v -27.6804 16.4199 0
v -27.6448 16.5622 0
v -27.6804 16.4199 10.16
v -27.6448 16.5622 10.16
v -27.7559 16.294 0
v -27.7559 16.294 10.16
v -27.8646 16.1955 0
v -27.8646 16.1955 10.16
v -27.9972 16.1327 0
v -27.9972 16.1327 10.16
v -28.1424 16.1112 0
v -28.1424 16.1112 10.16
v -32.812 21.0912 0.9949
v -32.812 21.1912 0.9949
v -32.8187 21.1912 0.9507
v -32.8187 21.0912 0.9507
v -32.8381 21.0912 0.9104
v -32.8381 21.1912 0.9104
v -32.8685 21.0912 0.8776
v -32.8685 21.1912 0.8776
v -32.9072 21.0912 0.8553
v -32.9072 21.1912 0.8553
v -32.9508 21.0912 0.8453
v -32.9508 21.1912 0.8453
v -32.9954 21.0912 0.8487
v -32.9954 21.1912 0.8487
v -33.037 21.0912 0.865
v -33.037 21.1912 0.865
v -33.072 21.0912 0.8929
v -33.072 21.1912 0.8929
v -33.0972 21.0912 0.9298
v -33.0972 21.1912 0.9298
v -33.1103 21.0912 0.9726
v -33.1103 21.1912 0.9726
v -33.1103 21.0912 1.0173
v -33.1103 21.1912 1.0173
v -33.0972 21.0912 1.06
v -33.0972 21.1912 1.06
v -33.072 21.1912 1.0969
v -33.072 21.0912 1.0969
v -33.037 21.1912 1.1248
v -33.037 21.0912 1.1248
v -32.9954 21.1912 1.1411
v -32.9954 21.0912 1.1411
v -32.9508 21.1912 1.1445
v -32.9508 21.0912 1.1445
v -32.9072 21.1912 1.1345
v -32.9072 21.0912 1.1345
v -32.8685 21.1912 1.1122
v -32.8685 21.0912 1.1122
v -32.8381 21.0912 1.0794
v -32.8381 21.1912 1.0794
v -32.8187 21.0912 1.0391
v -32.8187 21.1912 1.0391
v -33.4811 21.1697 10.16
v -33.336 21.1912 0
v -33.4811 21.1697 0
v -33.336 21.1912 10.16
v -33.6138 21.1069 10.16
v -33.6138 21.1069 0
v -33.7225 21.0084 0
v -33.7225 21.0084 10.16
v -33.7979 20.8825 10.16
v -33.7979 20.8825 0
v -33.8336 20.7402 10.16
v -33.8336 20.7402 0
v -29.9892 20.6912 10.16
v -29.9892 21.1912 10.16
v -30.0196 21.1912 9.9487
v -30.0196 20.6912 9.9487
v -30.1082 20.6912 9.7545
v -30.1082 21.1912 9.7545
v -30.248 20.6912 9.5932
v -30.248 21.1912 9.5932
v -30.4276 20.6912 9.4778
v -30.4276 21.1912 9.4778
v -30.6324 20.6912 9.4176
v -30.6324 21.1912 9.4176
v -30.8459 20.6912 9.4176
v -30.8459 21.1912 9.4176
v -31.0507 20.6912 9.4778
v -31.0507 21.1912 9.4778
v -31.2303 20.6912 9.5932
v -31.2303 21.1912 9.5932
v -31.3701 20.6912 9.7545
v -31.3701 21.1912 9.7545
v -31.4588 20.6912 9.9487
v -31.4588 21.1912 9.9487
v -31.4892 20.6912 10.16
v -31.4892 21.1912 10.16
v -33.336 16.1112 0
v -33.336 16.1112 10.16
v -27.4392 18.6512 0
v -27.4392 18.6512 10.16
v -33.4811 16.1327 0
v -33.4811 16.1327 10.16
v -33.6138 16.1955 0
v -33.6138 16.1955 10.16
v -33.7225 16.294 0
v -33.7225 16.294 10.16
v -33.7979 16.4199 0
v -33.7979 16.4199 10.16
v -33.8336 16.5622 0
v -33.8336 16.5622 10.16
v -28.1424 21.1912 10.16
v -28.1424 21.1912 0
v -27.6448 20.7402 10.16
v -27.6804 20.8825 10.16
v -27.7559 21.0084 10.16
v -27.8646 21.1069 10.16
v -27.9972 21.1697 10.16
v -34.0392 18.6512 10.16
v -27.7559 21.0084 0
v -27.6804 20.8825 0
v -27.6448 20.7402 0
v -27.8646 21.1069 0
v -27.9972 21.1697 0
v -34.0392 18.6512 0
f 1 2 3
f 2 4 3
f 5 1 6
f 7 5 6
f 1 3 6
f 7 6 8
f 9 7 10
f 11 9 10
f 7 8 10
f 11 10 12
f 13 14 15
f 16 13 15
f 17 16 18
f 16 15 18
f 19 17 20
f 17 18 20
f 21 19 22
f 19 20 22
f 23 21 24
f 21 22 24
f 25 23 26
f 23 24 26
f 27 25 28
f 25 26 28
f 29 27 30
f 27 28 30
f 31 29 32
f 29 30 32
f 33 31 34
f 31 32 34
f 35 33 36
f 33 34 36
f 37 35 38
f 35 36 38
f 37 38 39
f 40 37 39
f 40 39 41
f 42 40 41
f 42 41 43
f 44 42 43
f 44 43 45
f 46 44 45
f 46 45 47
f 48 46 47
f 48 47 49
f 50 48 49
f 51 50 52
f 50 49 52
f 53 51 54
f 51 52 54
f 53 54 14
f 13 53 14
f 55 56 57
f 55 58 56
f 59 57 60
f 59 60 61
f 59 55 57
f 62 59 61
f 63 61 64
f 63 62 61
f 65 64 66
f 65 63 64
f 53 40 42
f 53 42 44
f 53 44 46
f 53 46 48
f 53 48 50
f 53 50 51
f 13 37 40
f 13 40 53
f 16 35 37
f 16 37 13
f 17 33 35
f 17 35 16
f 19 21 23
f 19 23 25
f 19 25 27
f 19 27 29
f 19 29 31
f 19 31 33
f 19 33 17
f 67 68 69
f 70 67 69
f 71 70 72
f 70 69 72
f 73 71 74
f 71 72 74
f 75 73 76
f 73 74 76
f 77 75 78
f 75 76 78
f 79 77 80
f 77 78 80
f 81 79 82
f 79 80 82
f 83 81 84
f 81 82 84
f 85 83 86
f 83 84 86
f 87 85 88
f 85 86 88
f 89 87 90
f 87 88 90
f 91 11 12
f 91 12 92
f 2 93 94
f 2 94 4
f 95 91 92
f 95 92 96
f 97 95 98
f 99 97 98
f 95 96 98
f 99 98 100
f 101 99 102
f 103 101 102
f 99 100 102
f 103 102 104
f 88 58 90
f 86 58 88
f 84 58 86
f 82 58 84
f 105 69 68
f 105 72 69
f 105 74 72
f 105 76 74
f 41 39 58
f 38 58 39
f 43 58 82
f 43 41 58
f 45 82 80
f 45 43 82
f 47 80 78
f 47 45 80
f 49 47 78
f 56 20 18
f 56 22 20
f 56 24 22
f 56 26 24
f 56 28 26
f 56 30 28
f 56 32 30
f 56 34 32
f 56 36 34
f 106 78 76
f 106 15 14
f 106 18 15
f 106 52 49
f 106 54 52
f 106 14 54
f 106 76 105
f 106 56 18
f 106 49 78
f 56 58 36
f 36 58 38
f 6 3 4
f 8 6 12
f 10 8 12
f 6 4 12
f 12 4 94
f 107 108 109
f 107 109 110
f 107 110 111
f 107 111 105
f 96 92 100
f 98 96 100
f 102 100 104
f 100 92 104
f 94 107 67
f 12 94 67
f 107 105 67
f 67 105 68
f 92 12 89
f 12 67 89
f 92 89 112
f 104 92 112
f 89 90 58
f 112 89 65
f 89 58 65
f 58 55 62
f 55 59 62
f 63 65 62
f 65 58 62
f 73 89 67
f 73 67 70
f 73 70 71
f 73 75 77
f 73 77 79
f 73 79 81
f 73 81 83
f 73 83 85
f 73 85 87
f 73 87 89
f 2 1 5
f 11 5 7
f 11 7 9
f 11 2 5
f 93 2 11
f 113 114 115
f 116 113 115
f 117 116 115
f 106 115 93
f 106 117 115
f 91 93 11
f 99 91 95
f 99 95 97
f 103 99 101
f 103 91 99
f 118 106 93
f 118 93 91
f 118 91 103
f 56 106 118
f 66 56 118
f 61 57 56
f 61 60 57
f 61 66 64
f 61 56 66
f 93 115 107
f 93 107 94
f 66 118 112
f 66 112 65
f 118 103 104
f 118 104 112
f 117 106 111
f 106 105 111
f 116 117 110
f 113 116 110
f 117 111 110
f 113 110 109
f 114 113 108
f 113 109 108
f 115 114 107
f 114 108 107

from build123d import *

# Parameters (mm, degrees)
BOSS_EXTRUDE1_DEPTH = 10.16
FILLET1_R           = 0.5
SKETCH36_R          = 0.15
CUT_EXTRUDE26_DEPTH = 0.1
SKETCH37_R          = 0.75
CUT_EXTRUDE27_DEPTH = 0.5


with BuildPart() as part:
    # Sketch1 → Boss-Extrude1 (new body)
    with BuildSketch(Plane.XY):
        Polygon((-33.789176406, 21.191188847), (-27.689176406, 21.191188847), (-27.439176406, 18.651188847), (-27.689176406, 16.111188847), (-33.789176406, 16.111188847), (-34.039176406, 18.651188847), align=None)
    extrude(amount=BOSS_EXTRUDE1_DEPTH)

    # Fillet1
    fillet1_edges = [part.edges().sort_by_distance(p)[0] for p in [
        (-33.789176406, 21.191188847, 5.08),
        (-27.689176406, 21.191188847, 5.08),
        (-27.689176406, 16.111188847, 5.08),
        (-33.789176406, 16.111188847, 5.08),
    ]]
    fillet(fillet1_edges, radius=FILLET1_R)

    # Sketch36 → Cut-Extrude26 (cut)
    with BuildSketch(Plane(origin=(0, 21.191188847, 0), x_dir=(1, 0, 0), z_dir=(0, 1, 0))):
        with Locations((-32.962004814, -0.994910083)):
            Circle(SKETCH36_R)
    extrude(amount=-CUT_EXTRUDE26_DEPTH, mode=Mode.SUBTRACT)

    # Sketch37 → Cut-Extrude27 (cut)
    with BuildSketch(Plane(origin=(0, 21.191188847, 0), x_dir=(1, 0, 0), z_dir=(0, 1, 0))):
        with Locations((-30.739176406, -10.16)):
            Circle(SKETCH37_R)
    extrude(amount=-CUT_EXTRUDE27_DEPTH, mode=Mode.SUBTRACT)


solid = part.part
